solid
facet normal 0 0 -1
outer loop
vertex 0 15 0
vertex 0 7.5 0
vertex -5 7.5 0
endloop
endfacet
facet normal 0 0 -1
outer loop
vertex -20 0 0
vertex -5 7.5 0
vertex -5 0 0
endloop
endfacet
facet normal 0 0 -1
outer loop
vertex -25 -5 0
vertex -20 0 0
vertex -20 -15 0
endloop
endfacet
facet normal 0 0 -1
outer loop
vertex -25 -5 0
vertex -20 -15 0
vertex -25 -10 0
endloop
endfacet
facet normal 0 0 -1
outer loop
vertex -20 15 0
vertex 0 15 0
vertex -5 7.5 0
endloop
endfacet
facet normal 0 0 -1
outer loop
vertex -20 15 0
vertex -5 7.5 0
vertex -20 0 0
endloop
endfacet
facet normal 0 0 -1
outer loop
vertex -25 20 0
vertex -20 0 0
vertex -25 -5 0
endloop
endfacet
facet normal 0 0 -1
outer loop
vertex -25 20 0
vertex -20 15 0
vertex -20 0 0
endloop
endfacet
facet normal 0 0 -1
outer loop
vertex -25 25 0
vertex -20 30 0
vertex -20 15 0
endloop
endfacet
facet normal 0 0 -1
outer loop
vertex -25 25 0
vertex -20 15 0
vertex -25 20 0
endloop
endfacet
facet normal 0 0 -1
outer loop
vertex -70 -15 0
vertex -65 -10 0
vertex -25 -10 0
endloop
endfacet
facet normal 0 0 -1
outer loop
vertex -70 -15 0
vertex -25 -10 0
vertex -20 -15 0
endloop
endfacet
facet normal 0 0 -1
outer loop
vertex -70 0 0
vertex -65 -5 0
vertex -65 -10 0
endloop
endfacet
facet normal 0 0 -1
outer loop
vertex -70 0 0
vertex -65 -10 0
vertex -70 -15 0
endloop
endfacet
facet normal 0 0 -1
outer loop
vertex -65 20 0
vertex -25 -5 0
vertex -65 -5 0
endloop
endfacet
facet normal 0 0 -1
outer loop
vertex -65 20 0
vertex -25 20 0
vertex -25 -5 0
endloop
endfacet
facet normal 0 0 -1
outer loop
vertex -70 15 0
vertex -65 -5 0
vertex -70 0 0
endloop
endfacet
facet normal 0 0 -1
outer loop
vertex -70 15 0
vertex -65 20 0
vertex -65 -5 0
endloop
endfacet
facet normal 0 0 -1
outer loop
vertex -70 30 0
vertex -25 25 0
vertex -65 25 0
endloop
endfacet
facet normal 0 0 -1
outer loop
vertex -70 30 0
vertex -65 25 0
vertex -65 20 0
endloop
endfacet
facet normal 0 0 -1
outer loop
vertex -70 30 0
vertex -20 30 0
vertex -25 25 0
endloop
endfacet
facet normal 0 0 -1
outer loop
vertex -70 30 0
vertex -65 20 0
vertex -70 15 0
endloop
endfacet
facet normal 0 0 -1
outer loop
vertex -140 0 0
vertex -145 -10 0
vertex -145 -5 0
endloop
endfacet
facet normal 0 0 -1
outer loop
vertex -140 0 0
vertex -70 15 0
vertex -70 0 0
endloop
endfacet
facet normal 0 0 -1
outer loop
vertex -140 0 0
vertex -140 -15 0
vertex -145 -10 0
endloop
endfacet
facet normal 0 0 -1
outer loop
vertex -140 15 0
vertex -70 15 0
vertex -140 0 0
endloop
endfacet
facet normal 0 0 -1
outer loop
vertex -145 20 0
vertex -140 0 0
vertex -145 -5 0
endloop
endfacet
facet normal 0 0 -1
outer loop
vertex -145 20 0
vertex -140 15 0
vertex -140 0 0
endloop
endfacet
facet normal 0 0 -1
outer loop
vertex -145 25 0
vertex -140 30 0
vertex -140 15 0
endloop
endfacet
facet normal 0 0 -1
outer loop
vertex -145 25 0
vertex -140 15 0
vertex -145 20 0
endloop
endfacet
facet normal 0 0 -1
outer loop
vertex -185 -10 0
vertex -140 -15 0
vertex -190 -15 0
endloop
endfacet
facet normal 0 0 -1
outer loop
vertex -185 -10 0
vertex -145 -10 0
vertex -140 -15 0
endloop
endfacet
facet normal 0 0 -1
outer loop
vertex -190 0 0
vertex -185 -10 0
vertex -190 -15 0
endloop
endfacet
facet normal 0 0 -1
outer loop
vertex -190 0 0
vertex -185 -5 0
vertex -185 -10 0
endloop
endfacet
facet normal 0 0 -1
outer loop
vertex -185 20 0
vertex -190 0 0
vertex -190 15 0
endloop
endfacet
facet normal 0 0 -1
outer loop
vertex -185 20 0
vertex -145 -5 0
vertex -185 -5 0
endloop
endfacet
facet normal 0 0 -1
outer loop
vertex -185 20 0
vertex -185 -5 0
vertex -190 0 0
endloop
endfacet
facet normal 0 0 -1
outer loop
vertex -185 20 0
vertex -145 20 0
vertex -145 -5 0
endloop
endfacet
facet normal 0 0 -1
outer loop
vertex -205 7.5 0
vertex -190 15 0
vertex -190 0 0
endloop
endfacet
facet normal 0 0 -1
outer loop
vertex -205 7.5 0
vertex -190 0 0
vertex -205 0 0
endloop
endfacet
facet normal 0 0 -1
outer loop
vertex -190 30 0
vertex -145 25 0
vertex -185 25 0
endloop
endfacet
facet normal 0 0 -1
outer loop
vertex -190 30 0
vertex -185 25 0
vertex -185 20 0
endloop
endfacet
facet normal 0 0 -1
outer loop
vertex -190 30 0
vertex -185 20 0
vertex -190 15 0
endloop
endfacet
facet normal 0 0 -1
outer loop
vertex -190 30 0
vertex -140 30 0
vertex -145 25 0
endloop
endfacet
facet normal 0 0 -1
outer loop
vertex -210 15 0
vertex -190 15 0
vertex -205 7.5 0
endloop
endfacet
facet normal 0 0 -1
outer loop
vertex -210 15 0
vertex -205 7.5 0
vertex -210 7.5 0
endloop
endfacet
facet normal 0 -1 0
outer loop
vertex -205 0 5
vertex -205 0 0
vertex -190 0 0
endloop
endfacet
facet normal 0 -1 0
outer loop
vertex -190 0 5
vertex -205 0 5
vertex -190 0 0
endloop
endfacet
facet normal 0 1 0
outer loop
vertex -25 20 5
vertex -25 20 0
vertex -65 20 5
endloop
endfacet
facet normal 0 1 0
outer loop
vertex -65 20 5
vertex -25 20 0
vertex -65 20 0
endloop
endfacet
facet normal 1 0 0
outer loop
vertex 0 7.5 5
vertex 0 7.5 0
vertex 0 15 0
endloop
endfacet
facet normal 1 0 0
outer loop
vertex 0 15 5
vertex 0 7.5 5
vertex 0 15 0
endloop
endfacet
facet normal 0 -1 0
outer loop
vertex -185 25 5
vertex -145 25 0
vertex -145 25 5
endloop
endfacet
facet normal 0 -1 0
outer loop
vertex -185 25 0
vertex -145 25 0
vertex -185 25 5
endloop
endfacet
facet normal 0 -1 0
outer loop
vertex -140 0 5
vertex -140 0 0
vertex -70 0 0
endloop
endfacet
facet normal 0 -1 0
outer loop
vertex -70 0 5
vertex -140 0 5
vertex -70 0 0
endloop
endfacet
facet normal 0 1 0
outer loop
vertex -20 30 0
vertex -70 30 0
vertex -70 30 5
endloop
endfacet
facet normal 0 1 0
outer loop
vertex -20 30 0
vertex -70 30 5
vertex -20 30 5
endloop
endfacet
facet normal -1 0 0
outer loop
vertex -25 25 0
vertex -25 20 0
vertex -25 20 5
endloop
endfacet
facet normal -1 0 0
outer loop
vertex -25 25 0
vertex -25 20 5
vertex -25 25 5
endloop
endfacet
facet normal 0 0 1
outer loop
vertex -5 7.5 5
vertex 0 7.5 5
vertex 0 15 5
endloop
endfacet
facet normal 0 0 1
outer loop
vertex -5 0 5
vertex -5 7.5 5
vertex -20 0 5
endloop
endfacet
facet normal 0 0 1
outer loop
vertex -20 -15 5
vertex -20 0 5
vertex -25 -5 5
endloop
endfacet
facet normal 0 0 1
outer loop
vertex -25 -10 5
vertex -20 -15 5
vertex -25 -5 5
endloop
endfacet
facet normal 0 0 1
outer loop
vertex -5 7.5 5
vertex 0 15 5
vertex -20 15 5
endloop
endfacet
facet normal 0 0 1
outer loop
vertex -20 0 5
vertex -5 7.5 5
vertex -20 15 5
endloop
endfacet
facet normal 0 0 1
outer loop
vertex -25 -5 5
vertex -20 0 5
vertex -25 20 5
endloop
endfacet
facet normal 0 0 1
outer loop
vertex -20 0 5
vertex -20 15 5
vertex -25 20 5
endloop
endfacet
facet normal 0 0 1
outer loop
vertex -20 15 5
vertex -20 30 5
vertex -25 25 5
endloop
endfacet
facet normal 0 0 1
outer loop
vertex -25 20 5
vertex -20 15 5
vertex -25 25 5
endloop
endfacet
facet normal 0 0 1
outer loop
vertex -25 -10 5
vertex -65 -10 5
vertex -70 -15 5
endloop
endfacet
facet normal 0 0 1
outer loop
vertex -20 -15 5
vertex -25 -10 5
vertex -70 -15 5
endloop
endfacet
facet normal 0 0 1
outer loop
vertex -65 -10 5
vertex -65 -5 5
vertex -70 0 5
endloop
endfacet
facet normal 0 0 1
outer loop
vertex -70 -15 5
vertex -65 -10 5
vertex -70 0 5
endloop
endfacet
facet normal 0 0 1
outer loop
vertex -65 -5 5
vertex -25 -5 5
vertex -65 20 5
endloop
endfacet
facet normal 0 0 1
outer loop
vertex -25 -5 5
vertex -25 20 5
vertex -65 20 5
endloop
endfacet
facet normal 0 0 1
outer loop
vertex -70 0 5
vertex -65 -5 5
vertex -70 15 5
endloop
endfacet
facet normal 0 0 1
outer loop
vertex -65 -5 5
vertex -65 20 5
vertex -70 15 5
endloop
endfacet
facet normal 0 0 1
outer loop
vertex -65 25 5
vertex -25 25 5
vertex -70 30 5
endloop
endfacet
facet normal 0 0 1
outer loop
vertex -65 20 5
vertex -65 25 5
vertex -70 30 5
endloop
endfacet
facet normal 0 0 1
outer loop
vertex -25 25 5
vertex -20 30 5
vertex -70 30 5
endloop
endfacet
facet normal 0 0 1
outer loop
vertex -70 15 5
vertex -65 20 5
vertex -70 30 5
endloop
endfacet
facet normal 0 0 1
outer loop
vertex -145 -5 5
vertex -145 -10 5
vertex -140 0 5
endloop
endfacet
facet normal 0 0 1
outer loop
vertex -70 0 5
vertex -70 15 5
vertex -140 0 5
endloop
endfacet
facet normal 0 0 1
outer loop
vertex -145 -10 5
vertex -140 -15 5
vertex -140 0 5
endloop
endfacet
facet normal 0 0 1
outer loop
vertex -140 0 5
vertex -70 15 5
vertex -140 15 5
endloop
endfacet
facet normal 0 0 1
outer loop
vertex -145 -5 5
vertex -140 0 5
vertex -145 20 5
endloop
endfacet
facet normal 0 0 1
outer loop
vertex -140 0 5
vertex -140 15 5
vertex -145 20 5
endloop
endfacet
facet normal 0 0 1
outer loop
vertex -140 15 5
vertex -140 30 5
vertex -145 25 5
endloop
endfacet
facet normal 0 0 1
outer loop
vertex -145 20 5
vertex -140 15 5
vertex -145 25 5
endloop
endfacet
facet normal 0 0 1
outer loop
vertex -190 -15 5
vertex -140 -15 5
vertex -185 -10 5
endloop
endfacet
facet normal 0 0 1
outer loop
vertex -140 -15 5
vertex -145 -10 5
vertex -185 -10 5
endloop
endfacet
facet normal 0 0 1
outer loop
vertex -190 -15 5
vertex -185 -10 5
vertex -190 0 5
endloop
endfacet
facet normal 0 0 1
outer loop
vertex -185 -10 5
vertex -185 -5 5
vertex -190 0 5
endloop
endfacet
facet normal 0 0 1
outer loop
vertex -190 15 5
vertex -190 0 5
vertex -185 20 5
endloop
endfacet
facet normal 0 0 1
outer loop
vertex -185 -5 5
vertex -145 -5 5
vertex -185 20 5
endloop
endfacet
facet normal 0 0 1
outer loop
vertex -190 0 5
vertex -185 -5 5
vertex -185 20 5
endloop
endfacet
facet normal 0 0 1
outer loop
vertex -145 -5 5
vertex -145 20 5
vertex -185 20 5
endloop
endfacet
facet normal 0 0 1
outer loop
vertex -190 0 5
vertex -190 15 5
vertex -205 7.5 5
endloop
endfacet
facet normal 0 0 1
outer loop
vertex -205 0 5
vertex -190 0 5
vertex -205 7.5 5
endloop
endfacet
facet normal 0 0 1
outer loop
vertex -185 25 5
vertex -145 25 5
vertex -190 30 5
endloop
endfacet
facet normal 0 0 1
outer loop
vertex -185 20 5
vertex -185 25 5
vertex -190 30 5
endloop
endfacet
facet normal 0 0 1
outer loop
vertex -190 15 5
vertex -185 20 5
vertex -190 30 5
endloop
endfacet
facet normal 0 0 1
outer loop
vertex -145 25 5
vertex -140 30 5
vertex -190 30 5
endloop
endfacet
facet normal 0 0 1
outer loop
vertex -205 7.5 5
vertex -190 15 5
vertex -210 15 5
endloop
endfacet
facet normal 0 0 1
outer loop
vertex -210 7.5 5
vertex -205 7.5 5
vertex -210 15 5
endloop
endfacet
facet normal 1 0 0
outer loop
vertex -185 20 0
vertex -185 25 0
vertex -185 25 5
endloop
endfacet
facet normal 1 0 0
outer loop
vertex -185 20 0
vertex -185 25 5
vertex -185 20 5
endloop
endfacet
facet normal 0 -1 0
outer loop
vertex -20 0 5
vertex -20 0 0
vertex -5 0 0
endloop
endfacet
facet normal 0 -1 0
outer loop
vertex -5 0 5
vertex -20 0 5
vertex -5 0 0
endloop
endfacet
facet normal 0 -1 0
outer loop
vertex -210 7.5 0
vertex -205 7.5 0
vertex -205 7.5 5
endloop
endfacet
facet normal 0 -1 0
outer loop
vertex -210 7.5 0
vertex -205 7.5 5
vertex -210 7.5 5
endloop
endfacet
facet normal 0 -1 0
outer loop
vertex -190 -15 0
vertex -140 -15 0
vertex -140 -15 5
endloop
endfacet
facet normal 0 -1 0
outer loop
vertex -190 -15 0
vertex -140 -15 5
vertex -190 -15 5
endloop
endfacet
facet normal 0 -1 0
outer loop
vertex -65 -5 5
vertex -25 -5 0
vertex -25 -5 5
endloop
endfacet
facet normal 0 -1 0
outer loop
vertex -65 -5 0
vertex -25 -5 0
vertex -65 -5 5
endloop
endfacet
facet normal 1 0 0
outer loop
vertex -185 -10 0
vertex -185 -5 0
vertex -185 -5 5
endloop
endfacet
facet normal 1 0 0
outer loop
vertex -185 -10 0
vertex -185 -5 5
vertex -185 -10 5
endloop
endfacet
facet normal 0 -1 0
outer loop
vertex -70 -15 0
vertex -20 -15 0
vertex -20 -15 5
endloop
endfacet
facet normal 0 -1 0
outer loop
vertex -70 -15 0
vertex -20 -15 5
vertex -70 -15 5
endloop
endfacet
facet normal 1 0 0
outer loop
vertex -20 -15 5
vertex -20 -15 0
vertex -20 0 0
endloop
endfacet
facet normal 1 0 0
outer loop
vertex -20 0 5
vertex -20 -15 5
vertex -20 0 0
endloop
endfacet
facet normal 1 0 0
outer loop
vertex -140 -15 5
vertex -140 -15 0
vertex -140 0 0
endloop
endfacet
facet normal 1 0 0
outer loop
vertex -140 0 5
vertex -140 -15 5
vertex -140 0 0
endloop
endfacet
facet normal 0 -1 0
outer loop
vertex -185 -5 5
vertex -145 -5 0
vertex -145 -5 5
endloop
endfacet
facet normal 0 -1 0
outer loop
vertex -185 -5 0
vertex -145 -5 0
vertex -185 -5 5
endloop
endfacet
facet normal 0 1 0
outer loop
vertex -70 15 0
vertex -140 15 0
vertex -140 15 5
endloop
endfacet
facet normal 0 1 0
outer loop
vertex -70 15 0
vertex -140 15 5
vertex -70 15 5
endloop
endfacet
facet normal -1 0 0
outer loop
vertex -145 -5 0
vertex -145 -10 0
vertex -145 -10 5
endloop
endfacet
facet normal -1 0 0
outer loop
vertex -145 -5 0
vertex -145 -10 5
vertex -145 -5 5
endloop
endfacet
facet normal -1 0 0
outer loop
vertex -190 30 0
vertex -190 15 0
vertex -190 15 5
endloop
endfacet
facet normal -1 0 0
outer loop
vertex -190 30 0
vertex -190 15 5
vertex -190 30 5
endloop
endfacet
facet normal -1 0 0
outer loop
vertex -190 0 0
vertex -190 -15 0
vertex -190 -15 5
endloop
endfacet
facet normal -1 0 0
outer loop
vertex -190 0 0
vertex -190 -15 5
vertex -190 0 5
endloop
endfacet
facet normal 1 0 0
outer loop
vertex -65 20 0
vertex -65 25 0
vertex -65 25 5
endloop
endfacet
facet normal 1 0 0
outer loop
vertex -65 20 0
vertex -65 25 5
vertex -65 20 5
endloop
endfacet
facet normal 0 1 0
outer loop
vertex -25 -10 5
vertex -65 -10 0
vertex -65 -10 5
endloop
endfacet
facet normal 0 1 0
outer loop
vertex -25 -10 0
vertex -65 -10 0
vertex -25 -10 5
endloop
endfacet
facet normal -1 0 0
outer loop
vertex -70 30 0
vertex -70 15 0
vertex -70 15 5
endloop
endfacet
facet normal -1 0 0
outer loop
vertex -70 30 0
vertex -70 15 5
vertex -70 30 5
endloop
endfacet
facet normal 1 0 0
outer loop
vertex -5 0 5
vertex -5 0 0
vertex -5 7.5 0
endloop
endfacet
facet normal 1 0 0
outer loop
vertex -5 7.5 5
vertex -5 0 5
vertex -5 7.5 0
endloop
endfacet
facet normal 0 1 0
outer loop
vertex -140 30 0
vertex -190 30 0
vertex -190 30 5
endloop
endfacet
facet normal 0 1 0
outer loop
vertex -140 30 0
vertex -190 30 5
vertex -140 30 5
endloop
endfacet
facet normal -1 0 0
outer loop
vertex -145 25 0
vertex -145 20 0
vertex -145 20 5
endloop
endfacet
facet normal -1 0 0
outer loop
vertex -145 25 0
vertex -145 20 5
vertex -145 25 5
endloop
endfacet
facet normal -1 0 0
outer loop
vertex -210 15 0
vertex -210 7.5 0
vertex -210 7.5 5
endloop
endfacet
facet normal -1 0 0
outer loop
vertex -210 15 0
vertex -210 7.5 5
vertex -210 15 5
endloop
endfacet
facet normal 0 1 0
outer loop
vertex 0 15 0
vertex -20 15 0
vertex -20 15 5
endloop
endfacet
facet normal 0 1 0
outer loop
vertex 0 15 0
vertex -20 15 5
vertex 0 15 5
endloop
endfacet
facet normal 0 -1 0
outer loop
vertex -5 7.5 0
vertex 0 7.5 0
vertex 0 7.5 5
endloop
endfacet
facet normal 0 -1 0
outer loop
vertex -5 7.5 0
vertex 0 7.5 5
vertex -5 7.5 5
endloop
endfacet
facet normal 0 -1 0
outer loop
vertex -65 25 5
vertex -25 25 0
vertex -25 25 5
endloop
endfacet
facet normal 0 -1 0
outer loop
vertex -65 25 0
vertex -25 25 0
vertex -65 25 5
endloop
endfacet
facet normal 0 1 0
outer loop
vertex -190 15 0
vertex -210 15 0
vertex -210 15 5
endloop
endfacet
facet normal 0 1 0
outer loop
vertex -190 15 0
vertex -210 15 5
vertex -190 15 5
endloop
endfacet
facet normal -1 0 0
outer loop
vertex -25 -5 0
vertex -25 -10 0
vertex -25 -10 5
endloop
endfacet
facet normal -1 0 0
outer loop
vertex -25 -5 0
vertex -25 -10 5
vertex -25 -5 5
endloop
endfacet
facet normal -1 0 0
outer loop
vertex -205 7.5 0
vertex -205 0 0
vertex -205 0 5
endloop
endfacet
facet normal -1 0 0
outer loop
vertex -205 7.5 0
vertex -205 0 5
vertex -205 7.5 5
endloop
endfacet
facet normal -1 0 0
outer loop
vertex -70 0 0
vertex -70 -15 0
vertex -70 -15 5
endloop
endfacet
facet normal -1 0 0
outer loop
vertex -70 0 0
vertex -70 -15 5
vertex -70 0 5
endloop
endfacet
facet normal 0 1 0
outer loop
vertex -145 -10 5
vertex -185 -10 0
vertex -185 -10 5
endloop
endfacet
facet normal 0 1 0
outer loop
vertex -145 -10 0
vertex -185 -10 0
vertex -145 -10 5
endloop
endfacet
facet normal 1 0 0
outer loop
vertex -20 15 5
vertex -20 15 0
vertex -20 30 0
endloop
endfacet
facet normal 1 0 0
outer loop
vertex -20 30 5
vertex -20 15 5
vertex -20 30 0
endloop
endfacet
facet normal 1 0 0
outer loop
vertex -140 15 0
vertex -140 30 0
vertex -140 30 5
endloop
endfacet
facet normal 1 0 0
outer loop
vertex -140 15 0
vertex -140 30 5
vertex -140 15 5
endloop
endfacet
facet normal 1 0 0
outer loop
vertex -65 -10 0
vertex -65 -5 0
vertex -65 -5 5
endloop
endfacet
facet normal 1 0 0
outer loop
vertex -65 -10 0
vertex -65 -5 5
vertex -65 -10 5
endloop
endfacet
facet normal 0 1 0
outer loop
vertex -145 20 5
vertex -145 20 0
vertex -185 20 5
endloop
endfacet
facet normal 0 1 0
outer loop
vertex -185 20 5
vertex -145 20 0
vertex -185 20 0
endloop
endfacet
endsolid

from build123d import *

# Parameters (mm, degrees)
SKETCH1_W           = 210
SKETCH1_H           = 15
BOSS_EXTRUDE1_DEPTH = 5
SKETCH2_W           = 50
SKETCH2_H           = 5
BOSS_EXTRUDE2_DEPTH = 5
SKETCH3_W           = 5
SKETCH3_H           = 7.5
CUT_EXTRUDE1_DEPTH  = 5
BOSS_EXTRUDE3_DEPTH = 5


with BuildPart() as part:
    # Sketch1 → Boss-Extrude1 (new body)
    with BuildSketch(Plane.XY):
        with Locations((-105, 7.5)):
            Rectangle(SKETCH1_W, SKETCH1_H)
    extrude(amount=BOSS_EXTRUDE1_DEPTH)

    # Sketch2 → Boss-Extrude2 (add)
    with BuildSketch(Plane(origin=(0, 0, 0), x_dir=(-1, 0, 0), z_dir=(0, 0, -1))):
        with Locations((45, -2.5)):
            Rectangle(SKETCH2_W, SKETCH2_H)
        with Locations((165, -2.5)):
            Rectangle(SKETCH2_W, SKETCH2_H)
        with Locations((165, 17.5)):
            Rectangle(SKETCH2_W, SKETCH2_H)
        with Locations((45, 17.5)):
            Rectangle(SKETCH2_W, SKETCH2_H)
    extrude(amount=-BOSS_EXTRUDE2_DEPTH)

    # Sketch3 → Cut-Extrude1 (cut)
    with BuildSketch(Plane(origin=(0, 0, 0), x_dir=(-1, 0, 0), z_dir=(0, 0, -1))):
        with Locations((2.5, 3.75)):
            Rectangle(SKETCH3_W, SKETCH3_H)
        with Locations((207.5, 3.75)):
            Rectangle(SKETCH3_W, SKETCH3_H)
    extrude(amount=-CUT_EXTRUDE1_DEPTH, mode=Mode.SUBTRACT)

    # Sketch4 → Boss-Extrude3 (add)
    with BuildSketch(Plane(origin=(0, 0, 0), x_dir=(-1, 0, 0), z_dir=(0, 0, -1))):
        Polygon((140, 30), (140, 20), (145, 20), (145, 25), (185, 25), (185, 20), (190, 20), (190, 30), align=None)
        Polygon((20, 20), (25, 20), (25, 25), (65, 25), (65, 20), (70, 20), (70, 30), (20, 30), align=None)
        Polygon((70, -15), (70, -5), (65, -5), (65, -10), (25, -10), (25, -5), (20, -5), (20, -15), align=None)
        Polygon((190, -5), (185, -5), (185, -10), (145, -10), (145, -5), (140, -5), (140, -15), (190, -15), align=None)
    extrude(amount=-BOSS_EXTRUDE3_DEPTH)


solid = part.part
